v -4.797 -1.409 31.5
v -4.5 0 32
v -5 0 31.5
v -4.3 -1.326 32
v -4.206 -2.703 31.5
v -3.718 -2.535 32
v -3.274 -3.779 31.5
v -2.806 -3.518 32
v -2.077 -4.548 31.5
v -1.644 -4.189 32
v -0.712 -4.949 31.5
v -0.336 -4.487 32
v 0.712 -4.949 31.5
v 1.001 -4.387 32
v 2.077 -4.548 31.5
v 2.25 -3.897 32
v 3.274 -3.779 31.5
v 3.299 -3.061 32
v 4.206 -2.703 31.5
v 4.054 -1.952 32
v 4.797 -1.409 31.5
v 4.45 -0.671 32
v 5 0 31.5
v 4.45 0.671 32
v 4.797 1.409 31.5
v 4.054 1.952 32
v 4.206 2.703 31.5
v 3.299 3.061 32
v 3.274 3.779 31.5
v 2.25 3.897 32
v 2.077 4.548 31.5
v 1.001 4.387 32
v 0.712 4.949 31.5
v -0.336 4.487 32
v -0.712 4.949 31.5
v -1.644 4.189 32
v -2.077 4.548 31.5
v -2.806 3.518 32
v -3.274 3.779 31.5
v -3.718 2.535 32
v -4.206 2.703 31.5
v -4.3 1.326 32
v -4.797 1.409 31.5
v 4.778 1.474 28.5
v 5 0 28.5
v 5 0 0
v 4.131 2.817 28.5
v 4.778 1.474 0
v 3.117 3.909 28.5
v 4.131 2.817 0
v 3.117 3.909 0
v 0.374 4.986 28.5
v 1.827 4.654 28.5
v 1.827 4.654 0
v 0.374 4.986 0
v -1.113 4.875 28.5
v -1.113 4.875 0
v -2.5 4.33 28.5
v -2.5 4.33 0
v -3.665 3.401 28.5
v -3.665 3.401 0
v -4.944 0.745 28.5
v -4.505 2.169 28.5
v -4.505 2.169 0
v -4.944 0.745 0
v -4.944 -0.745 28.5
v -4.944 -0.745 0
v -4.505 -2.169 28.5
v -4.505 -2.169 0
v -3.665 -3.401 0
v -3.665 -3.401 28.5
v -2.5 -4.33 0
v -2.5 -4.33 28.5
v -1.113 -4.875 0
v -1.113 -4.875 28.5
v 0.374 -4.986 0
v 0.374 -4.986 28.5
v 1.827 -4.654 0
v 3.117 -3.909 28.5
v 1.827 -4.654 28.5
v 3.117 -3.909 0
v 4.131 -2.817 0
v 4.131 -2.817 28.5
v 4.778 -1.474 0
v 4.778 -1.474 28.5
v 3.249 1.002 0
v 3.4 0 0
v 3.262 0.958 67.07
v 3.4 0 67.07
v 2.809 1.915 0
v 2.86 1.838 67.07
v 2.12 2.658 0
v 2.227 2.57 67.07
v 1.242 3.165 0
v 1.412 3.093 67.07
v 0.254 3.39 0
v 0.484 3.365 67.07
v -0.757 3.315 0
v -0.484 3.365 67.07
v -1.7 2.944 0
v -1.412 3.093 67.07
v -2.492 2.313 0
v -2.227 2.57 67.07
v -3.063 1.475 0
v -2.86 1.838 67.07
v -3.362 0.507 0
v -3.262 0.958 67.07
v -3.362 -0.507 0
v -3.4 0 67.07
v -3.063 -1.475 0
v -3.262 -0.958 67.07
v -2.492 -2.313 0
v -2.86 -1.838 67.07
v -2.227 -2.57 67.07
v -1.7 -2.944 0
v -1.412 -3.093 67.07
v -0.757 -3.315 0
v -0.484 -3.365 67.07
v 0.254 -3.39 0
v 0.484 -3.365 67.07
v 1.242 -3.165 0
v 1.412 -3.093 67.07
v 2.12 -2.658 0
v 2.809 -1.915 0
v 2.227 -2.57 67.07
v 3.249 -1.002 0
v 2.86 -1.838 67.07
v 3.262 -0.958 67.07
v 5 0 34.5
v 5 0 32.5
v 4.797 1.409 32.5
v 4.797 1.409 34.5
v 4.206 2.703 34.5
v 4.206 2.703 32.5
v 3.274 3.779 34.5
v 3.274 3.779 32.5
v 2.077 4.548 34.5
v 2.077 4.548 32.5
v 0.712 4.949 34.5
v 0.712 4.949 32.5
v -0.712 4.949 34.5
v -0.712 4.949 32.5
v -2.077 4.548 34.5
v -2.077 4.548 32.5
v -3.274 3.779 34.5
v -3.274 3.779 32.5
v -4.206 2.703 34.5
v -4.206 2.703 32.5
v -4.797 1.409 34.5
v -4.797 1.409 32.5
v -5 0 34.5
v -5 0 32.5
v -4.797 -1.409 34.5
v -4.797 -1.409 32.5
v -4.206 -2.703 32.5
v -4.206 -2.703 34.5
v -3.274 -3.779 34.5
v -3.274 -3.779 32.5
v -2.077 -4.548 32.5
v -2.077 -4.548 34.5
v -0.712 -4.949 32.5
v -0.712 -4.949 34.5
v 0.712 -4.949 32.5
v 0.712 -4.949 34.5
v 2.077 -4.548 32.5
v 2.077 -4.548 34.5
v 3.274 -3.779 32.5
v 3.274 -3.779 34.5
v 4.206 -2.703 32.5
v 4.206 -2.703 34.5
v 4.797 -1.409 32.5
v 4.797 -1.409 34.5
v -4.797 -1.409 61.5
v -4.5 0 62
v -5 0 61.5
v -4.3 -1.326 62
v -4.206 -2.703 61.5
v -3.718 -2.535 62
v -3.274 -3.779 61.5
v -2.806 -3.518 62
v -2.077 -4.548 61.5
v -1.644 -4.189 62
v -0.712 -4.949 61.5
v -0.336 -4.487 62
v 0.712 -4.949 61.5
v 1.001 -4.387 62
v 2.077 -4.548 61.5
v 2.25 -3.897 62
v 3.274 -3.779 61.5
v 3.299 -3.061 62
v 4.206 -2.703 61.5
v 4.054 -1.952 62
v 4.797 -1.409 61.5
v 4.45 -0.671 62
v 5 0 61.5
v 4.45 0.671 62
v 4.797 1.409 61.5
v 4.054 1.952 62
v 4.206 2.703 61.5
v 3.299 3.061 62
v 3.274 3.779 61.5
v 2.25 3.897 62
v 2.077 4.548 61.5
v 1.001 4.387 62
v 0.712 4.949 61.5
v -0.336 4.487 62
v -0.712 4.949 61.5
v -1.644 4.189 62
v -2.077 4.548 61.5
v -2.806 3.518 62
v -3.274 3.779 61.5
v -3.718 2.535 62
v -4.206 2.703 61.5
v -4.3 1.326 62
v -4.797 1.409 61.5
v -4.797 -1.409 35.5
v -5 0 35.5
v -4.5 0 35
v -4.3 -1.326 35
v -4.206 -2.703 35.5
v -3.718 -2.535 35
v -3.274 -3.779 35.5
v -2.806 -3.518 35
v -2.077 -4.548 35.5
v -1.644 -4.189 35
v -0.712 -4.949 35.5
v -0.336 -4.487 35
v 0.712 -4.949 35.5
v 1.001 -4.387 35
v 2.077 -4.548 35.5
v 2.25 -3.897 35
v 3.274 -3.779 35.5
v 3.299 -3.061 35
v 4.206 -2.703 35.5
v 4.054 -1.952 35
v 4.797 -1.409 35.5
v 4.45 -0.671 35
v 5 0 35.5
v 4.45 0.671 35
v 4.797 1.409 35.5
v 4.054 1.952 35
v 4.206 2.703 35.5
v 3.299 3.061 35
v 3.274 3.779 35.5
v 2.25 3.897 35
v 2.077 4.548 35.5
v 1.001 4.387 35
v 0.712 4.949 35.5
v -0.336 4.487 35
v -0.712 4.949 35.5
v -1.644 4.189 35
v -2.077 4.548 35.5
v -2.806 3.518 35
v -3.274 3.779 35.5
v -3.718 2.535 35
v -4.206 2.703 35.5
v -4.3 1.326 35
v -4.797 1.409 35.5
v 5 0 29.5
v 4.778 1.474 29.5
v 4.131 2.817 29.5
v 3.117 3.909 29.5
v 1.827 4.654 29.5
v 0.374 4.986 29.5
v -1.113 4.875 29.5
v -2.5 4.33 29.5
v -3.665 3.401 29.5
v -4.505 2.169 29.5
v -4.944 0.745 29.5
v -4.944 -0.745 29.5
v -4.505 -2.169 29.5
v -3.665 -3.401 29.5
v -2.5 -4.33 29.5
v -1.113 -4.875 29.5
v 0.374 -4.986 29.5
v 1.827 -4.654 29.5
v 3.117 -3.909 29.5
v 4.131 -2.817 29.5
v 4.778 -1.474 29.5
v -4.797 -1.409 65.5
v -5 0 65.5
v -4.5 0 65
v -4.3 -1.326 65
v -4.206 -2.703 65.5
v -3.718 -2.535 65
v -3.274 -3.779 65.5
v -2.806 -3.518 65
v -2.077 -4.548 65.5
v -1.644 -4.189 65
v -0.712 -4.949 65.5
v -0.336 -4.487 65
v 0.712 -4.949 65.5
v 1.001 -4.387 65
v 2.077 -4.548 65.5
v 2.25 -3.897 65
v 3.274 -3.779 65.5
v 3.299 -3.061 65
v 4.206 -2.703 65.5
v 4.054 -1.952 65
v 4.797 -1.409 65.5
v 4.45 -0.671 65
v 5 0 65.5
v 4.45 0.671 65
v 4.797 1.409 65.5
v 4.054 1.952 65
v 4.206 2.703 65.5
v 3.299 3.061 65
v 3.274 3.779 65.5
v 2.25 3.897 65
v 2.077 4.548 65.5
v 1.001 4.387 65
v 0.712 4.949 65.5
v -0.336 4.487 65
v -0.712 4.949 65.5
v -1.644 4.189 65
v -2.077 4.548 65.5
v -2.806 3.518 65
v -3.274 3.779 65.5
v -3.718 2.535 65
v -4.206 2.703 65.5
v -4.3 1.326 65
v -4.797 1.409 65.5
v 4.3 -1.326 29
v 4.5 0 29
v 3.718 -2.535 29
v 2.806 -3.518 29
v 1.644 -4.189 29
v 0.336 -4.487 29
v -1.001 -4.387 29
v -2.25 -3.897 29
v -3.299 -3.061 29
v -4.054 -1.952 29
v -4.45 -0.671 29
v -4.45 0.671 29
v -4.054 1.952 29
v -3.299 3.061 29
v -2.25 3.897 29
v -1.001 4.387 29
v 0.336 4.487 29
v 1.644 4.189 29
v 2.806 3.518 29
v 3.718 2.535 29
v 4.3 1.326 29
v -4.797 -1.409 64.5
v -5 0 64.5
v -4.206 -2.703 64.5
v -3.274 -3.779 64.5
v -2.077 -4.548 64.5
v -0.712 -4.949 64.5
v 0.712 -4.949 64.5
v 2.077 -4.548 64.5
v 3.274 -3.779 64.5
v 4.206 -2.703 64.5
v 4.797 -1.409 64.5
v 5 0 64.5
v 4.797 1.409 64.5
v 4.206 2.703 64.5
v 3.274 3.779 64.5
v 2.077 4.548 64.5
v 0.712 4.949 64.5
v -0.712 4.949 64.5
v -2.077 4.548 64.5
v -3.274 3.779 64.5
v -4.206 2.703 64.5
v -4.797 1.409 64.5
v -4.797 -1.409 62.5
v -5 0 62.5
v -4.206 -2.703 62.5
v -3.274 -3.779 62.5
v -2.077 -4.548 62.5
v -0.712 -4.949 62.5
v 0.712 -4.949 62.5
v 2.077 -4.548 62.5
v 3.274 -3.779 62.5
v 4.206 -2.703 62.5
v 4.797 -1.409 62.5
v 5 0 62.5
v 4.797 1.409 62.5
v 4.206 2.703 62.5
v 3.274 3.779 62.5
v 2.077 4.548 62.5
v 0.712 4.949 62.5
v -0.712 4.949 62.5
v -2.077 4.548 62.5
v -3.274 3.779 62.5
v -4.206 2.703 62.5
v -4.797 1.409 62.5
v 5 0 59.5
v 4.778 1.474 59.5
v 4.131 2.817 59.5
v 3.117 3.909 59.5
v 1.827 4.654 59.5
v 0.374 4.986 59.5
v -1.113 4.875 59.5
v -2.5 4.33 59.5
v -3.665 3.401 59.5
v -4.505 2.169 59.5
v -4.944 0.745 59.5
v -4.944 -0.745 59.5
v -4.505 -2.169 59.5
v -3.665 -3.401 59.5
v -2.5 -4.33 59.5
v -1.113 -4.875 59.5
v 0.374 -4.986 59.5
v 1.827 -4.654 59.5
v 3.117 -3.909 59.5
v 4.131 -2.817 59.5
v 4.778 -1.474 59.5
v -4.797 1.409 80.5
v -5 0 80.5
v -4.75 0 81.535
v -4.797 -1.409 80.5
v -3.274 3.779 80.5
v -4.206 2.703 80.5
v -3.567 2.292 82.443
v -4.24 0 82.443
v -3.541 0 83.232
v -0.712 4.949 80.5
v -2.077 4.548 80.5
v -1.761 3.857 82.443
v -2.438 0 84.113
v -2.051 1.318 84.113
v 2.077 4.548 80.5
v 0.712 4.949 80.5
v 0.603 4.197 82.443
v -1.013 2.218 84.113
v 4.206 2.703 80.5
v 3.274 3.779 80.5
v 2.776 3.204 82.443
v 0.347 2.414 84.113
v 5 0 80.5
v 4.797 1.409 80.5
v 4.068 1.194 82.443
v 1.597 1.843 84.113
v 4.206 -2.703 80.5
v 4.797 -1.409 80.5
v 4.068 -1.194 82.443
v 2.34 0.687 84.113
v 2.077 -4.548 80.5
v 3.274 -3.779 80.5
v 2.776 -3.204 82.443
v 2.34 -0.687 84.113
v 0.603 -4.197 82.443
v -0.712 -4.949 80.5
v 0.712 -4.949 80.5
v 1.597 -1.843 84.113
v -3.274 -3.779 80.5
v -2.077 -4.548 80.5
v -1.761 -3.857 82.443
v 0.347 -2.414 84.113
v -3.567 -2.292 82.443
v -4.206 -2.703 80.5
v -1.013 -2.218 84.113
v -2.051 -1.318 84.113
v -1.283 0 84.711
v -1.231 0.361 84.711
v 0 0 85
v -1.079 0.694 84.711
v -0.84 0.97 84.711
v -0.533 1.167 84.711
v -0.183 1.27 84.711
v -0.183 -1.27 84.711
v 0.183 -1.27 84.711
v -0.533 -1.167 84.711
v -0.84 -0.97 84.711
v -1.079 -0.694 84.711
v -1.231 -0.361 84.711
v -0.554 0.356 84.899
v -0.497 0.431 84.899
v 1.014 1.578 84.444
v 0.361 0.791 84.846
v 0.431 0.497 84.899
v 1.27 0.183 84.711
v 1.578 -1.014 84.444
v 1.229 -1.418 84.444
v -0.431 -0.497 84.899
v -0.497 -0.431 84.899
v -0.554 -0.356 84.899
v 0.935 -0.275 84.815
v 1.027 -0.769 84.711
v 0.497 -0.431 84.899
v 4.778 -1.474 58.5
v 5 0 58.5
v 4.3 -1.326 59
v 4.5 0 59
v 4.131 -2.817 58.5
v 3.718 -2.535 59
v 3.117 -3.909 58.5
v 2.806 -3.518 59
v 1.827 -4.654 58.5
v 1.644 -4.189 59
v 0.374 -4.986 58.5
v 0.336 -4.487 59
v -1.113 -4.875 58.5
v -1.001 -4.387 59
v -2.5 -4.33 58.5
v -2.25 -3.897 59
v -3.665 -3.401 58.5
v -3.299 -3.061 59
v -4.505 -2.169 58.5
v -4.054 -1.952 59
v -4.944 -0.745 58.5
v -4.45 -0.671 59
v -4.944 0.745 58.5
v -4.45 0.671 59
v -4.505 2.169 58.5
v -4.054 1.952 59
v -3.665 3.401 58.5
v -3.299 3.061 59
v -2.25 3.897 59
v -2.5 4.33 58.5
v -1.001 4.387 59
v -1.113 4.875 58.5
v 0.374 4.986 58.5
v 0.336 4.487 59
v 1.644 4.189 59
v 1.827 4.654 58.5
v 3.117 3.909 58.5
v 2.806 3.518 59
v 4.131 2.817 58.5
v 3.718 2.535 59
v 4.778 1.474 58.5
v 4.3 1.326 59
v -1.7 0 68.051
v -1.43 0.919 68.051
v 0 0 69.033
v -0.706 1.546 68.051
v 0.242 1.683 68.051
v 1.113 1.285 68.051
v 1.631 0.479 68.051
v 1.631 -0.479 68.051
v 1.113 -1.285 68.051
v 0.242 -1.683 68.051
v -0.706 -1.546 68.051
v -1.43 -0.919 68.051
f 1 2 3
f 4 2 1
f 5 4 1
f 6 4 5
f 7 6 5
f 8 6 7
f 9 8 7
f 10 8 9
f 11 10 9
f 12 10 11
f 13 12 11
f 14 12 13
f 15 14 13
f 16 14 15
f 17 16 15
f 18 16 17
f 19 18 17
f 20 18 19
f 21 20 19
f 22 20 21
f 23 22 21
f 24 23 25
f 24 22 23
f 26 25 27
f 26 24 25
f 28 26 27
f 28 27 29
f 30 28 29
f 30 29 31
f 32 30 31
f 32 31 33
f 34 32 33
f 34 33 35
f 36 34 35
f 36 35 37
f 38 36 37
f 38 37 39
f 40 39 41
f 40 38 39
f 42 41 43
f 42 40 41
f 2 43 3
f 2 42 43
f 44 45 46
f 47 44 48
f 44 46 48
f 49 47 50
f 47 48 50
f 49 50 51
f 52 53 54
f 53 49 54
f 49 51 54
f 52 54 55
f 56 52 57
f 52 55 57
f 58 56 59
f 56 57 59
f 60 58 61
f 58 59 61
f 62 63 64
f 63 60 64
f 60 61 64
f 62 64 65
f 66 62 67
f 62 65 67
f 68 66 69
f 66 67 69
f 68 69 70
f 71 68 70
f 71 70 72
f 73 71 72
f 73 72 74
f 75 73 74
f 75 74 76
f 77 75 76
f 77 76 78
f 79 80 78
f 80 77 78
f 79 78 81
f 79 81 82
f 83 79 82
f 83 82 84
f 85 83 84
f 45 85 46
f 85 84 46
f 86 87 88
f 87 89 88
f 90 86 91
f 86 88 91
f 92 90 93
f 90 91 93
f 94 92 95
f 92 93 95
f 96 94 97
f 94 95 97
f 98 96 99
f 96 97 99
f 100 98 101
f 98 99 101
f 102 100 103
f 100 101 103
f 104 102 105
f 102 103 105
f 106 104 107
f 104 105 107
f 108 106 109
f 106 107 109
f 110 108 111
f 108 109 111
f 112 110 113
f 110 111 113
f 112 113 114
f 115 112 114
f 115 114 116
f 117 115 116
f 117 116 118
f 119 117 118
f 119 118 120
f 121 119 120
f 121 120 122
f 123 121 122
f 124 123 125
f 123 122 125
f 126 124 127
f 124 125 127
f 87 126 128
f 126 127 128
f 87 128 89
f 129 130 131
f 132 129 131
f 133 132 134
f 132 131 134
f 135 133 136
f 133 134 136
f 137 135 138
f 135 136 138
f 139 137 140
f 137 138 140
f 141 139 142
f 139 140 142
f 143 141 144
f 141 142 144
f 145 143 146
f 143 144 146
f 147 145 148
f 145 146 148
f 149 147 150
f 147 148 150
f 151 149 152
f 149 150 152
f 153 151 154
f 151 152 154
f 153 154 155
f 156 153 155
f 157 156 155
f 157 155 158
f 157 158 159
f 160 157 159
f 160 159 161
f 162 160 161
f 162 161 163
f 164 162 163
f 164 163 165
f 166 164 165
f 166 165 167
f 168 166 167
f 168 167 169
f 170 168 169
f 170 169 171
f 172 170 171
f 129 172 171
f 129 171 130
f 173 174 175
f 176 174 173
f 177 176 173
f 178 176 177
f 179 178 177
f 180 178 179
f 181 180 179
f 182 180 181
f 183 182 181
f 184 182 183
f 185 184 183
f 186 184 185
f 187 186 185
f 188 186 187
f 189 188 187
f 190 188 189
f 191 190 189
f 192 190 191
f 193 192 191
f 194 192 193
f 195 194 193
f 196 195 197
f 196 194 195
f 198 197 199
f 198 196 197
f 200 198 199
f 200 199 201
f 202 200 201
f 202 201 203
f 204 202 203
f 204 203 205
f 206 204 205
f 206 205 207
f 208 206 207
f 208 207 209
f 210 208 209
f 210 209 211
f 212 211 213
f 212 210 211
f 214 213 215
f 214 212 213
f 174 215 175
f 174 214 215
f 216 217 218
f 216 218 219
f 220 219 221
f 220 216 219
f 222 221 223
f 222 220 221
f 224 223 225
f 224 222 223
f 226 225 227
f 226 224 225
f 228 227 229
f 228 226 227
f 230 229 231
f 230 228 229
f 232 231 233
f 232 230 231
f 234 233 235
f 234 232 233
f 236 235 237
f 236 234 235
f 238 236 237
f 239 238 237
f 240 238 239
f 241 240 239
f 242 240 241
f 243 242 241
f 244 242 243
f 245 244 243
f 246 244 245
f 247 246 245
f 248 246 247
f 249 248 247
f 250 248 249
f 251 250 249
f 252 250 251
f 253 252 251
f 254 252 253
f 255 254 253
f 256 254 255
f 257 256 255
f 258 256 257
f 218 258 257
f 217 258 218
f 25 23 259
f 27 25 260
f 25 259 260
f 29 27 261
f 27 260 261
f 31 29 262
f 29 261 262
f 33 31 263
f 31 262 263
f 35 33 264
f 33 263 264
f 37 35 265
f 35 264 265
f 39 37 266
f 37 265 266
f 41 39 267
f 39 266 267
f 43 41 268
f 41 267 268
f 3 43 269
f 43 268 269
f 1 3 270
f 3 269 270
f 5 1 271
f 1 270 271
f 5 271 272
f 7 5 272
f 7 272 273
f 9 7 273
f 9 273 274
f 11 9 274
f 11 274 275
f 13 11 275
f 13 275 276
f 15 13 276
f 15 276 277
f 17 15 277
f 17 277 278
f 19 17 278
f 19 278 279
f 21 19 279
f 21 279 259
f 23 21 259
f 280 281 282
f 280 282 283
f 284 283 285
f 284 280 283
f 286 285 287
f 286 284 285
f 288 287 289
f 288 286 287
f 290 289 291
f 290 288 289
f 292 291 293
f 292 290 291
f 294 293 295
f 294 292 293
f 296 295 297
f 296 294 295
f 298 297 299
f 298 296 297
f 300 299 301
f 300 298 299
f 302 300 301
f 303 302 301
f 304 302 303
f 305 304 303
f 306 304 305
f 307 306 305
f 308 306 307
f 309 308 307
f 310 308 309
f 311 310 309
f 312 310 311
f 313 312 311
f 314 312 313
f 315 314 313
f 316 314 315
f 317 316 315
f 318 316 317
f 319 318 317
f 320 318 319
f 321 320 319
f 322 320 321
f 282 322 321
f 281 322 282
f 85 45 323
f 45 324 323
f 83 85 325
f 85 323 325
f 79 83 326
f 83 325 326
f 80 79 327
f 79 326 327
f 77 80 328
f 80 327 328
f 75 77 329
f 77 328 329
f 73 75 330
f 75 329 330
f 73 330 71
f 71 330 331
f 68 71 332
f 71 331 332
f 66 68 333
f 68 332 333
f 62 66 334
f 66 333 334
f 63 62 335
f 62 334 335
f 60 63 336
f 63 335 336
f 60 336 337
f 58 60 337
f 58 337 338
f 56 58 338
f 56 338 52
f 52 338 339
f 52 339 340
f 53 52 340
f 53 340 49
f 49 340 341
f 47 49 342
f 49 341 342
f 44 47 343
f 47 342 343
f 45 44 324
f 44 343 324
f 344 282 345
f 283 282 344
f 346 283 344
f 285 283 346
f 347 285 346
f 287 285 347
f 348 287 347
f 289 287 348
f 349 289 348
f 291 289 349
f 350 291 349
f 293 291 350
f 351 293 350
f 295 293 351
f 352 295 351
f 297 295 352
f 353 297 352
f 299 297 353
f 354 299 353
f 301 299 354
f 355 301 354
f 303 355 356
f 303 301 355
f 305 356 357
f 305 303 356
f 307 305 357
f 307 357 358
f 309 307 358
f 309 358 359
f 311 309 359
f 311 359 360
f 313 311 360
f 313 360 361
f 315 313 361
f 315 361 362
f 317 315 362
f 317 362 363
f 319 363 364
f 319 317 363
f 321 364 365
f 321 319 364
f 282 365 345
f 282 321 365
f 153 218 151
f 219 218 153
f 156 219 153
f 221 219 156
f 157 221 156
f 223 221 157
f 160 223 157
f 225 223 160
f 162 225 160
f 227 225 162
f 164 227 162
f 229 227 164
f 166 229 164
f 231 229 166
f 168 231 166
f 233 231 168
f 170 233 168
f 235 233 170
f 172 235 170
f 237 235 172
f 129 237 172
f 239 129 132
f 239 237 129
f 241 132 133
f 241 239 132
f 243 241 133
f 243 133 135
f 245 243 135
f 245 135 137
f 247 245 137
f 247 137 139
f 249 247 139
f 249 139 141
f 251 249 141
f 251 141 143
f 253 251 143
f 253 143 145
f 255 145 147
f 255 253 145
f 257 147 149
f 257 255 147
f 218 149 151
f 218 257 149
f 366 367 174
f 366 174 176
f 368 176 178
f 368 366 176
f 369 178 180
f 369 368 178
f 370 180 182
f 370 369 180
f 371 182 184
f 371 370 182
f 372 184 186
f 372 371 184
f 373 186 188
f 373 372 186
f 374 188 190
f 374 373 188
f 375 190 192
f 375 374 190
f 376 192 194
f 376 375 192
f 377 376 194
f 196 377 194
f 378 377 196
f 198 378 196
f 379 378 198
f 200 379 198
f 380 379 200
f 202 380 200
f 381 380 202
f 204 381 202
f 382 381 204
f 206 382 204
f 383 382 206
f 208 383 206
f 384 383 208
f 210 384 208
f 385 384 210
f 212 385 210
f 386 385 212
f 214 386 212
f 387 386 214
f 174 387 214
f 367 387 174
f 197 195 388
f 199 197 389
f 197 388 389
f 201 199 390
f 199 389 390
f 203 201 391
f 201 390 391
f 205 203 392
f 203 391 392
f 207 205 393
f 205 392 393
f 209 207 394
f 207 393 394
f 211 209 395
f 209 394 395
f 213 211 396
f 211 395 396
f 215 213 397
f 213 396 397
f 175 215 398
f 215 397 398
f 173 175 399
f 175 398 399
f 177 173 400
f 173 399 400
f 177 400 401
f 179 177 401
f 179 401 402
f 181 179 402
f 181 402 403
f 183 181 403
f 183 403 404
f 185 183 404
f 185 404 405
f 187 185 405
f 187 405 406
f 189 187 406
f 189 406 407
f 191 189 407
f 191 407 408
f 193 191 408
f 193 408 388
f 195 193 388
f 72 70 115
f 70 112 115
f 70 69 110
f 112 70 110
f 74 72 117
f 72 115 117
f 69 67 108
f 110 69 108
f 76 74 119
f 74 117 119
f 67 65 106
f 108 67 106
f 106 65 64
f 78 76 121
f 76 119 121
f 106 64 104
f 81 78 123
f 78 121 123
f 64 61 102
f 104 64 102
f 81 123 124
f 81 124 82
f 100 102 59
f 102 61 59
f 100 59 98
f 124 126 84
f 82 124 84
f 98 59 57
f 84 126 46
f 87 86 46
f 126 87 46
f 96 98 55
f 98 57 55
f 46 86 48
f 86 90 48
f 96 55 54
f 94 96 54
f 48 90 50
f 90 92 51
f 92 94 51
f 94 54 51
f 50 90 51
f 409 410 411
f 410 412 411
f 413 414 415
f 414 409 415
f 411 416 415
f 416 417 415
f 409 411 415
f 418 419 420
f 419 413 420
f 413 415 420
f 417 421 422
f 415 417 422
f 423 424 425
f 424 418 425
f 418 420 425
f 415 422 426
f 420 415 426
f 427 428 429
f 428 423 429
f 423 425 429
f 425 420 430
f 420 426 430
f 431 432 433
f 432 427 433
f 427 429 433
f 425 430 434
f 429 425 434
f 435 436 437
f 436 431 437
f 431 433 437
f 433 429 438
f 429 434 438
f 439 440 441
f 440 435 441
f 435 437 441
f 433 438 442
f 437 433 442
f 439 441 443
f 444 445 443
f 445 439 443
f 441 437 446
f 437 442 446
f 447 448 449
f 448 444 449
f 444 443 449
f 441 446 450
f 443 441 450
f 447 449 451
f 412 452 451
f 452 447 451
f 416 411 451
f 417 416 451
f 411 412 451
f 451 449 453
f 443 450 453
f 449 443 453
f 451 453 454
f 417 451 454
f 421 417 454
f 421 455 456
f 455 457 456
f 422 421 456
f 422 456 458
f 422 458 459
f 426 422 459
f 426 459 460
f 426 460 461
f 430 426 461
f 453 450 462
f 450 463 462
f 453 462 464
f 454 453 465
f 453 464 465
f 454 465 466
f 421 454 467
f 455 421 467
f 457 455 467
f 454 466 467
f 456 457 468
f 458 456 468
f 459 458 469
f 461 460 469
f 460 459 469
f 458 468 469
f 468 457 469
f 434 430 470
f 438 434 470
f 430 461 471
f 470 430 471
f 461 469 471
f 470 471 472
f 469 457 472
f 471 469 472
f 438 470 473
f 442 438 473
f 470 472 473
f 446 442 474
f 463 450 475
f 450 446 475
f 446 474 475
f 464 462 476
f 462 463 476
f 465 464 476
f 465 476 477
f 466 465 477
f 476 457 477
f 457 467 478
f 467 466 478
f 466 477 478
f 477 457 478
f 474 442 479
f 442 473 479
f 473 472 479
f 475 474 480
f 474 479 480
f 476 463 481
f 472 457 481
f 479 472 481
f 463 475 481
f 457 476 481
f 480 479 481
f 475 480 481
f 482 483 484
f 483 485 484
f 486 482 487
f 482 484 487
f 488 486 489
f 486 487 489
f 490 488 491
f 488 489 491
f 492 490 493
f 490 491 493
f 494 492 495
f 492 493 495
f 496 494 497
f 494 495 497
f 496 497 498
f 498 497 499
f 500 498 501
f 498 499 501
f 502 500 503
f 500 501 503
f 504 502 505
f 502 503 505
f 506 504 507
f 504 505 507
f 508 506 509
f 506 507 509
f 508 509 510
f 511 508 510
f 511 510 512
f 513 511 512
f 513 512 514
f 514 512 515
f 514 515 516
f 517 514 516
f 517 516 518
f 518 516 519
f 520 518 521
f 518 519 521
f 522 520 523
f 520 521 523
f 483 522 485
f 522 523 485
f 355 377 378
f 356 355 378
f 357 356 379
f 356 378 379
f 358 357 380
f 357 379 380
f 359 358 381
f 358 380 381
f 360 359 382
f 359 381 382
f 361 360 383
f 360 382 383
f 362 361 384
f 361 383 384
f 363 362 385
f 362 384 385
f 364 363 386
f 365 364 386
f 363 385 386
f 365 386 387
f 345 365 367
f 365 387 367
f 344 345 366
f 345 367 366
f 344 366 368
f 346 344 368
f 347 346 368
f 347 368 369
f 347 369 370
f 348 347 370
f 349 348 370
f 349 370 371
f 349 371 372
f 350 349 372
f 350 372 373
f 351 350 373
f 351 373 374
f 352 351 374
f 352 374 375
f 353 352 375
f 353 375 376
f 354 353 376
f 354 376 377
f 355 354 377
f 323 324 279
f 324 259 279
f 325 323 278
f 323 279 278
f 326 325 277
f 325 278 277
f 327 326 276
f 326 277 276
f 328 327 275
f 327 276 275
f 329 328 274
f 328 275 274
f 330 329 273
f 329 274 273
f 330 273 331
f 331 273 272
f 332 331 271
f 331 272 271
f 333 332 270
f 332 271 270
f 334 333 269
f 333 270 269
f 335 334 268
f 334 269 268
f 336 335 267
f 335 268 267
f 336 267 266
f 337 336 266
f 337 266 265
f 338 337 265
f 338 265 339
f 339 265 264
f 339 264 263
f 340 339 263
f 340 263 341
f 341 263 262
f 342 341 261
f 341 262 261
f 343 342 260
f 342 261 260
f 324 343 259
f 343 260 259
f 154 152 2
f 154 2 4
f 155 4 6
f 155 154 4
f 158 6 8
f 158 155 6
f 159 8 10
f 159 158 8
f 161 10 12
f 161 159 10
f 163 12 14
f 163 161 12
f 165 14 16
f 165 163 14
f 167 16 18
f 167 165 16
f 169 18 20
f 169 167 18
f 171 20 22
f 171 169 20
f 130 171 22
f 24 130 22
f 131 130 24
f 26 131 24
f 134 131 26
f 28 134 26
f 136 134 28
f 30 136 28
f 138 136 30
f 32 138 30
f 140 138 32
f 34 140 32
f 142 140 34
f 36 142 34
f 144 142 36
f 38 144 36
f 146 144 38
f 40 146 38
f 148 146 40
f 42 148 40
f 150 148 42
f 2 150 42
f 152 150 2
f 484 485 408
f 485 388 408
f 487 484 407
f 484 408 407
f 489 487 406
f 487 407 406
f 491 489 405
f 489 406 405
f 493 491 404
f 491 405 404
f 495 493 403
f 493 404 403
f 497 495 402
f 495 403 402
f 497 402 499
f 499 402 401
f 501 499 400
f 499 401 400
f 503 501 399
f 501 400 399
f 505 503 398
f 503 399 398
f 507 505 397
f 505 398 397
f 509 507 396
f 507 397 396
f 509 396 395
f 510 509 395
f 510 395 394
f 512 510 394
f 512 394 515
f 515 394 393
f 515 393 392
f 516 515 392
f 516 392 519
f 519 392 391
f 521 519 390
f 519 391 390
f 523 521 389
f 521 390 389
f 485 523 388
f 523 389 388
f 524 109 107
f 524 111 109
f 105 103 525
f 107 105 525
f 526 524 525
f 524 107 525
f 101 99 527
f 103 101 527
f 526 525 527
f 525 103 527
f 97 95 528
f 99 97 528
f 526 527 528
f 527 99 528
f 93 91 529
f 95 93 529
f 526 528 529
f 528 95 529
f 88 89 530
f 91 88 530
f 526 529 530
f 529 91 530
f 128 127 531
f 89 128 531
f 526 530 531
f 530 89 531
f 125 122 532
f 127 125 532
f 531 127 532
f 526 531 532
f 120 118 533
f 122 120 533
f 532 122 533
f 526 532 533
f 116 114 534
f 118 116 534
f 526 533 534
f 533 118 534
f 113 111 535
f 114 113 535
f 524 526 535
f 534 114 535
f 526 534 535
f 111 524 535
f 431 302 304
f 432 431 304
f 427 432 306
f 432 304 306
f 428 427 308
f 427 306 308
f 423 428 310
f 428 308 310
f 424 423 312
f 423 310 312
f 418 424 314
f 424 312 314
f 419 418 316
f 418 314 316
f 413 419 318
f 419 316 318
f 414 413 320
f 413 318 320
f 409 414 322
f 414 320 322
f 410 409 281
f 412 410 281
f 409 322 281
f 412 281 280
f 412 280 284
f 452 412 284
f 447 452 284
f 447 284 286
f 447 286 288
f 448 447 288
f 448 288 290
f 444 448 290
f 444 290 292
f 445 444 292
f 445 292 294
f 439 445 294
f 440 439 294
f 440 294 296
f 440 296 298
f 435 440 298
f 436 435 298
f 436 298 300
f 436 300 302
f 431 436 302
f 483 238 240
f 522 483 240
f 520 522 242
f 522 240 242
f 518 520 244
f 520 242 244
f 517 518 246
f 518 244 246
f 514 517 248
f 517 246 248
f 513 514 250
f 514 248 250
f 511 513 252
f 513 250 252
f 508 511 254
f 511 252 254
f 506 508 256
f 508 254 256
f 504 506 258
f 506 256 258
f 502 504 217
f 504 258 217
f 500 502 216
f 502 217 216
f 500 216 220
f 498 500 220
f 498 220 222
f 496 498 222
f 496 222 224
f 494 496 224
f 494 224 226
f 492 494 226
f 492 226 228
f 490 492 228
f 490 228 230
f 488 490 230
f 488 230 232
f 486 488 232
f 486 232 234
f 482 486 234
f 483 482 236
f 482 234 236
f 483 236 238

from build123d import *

# Parameters (mm, degrees)
SKETCH_1_R             = 5
EXTRUDE_1_DEPTH        = 80.5
PATTERN_LINEAR_1_COUNT = 2
PATTERN_LINEAR_1_PITCH = 30
HOLE_WIZARD_M8_1_D     = 6.8
HOLE_WIZARD_M8_1_DEPTH = 67.07
HOLE_WIZARD_M8_1_TIP   = 1.962990915


with BuildPart() as part:
    # 草图1 → 凸台-拉伸1 (new body)
    with BuildSketch(Plane.XY):
        Circle(SKETCH_1_R)
    extrude(amount=EXTRUDE_1_DEPTH)

    # 草图2 → 切除-旋转1 (revolve, cut)
    with BuildSketch(Plane(origin=(0, 0, 0), x_dir=(0, 0, -1), z_dir=(1, 0, 0)), mode=Mode.PRIVATE) as cut_revolve_1_sk:
        Polygon((-28.5, 5), (-29, 4.5), (-29.5, 5), align=None)
    cut_revolve_1 = revolve(cut_revolve_1_sk.sketch.rotate(Axis((0, 0, 95.745641227), (0, 0, -1)), 90), axis=Axis((0, 0, 95.745641227), (0, 0, -1)), mode=Mode.SUBTRACT)

    # 草图4 → 切除-旋转2 (revolve, cut)
    with BuildSketch(Plane(origin=(0, 0, 0), x_dir=(0, 0, -1), z_dir=(1, 0, 0)), mode=Mode.PRIVATE) as cut_revolve_2_sk:
        Polygon((-31.5, 5), (-32, 4.5), (-32.5, 5), align=None)
        Polygon((-34.5, 5), (-35, 4.5), (-35.5, 5), align=None)
    cut_revolve_2 = revolve(cut_revolve_2_sk.sketch.rotate(Axis((0, 0, -1.972626415), (0, 0, 1)), 90), axis=Axis((0, 0, -1.972626415), (0, 0, 1)), mode=Mode.SUBTRACT)

    # 阵列(线性)1: 切除-旋转1, 切除-旋转2 ×2
    with Locations(*[(0, 0, i * PATTERN_LINEAR_1_PITCH) for i in range(1, PATTERN_LINEAR_1_COUNT)]):
        add(cut_revolve_1, mode=Mode.SUBTRACT)
        add(cut_revolve_2, mode=Mode.SUBTRACT)

    # 草图5 → 旋转2 (revolve)
    with BuildSketch(Plane(origin=(0, 0, 0), x_dir=(0, 0, -1), z_dir=(1, 0, 0)), mode=Mode.PRIVATE) as revolve_2_sk:
        with BuildLine():
            Line((-80.5, 5), (-80.5, 0))
            Line((-80.5, 0), (-85, 0))
            add(Edge.make_bspline(
                [(-80.5, 5), (-81.808902232, 4.887546308), (-83.760685611, 3.318595148), (-84.908352583, 1.178697403), (-85, 0)],
                knots=[0, 0, 0, 0, 0.52200898, 1, 1, 1, 1], degree=3))
        make_face()
    revolve(revolve_2_sk.sketch.rotate(Axis((0, 0, 87.782786163), (0, 0, -1)), 270), axis=Axis((0, 0, 87.782786163), (0, 0, -1)))

    # M8 螺纹孔1
    with Locations(Plane(origin=(0, 0, 0), x_dir=(-1, 0, 0), z_dir=(0, 0, -1))):
        with Locations((0, 0)):
            Hole(HOLE_WIZARD_M8_1_D / 2, depth=HOLE_WIZARD_M8_1_DEPTH)
            with Locations((0, 0, -(HOLE_WIZARD_M8_1_DEPTH + HOLE_WIZARD_M8_1_TIP / 2))):  # 120° drill point
                Cone(0, HOLE_WIZARD_M8_1_D / 2, HOLE_WIZARD_M8_1_TIP, mode=Mode.SUBTRACT)


solid = part.part
